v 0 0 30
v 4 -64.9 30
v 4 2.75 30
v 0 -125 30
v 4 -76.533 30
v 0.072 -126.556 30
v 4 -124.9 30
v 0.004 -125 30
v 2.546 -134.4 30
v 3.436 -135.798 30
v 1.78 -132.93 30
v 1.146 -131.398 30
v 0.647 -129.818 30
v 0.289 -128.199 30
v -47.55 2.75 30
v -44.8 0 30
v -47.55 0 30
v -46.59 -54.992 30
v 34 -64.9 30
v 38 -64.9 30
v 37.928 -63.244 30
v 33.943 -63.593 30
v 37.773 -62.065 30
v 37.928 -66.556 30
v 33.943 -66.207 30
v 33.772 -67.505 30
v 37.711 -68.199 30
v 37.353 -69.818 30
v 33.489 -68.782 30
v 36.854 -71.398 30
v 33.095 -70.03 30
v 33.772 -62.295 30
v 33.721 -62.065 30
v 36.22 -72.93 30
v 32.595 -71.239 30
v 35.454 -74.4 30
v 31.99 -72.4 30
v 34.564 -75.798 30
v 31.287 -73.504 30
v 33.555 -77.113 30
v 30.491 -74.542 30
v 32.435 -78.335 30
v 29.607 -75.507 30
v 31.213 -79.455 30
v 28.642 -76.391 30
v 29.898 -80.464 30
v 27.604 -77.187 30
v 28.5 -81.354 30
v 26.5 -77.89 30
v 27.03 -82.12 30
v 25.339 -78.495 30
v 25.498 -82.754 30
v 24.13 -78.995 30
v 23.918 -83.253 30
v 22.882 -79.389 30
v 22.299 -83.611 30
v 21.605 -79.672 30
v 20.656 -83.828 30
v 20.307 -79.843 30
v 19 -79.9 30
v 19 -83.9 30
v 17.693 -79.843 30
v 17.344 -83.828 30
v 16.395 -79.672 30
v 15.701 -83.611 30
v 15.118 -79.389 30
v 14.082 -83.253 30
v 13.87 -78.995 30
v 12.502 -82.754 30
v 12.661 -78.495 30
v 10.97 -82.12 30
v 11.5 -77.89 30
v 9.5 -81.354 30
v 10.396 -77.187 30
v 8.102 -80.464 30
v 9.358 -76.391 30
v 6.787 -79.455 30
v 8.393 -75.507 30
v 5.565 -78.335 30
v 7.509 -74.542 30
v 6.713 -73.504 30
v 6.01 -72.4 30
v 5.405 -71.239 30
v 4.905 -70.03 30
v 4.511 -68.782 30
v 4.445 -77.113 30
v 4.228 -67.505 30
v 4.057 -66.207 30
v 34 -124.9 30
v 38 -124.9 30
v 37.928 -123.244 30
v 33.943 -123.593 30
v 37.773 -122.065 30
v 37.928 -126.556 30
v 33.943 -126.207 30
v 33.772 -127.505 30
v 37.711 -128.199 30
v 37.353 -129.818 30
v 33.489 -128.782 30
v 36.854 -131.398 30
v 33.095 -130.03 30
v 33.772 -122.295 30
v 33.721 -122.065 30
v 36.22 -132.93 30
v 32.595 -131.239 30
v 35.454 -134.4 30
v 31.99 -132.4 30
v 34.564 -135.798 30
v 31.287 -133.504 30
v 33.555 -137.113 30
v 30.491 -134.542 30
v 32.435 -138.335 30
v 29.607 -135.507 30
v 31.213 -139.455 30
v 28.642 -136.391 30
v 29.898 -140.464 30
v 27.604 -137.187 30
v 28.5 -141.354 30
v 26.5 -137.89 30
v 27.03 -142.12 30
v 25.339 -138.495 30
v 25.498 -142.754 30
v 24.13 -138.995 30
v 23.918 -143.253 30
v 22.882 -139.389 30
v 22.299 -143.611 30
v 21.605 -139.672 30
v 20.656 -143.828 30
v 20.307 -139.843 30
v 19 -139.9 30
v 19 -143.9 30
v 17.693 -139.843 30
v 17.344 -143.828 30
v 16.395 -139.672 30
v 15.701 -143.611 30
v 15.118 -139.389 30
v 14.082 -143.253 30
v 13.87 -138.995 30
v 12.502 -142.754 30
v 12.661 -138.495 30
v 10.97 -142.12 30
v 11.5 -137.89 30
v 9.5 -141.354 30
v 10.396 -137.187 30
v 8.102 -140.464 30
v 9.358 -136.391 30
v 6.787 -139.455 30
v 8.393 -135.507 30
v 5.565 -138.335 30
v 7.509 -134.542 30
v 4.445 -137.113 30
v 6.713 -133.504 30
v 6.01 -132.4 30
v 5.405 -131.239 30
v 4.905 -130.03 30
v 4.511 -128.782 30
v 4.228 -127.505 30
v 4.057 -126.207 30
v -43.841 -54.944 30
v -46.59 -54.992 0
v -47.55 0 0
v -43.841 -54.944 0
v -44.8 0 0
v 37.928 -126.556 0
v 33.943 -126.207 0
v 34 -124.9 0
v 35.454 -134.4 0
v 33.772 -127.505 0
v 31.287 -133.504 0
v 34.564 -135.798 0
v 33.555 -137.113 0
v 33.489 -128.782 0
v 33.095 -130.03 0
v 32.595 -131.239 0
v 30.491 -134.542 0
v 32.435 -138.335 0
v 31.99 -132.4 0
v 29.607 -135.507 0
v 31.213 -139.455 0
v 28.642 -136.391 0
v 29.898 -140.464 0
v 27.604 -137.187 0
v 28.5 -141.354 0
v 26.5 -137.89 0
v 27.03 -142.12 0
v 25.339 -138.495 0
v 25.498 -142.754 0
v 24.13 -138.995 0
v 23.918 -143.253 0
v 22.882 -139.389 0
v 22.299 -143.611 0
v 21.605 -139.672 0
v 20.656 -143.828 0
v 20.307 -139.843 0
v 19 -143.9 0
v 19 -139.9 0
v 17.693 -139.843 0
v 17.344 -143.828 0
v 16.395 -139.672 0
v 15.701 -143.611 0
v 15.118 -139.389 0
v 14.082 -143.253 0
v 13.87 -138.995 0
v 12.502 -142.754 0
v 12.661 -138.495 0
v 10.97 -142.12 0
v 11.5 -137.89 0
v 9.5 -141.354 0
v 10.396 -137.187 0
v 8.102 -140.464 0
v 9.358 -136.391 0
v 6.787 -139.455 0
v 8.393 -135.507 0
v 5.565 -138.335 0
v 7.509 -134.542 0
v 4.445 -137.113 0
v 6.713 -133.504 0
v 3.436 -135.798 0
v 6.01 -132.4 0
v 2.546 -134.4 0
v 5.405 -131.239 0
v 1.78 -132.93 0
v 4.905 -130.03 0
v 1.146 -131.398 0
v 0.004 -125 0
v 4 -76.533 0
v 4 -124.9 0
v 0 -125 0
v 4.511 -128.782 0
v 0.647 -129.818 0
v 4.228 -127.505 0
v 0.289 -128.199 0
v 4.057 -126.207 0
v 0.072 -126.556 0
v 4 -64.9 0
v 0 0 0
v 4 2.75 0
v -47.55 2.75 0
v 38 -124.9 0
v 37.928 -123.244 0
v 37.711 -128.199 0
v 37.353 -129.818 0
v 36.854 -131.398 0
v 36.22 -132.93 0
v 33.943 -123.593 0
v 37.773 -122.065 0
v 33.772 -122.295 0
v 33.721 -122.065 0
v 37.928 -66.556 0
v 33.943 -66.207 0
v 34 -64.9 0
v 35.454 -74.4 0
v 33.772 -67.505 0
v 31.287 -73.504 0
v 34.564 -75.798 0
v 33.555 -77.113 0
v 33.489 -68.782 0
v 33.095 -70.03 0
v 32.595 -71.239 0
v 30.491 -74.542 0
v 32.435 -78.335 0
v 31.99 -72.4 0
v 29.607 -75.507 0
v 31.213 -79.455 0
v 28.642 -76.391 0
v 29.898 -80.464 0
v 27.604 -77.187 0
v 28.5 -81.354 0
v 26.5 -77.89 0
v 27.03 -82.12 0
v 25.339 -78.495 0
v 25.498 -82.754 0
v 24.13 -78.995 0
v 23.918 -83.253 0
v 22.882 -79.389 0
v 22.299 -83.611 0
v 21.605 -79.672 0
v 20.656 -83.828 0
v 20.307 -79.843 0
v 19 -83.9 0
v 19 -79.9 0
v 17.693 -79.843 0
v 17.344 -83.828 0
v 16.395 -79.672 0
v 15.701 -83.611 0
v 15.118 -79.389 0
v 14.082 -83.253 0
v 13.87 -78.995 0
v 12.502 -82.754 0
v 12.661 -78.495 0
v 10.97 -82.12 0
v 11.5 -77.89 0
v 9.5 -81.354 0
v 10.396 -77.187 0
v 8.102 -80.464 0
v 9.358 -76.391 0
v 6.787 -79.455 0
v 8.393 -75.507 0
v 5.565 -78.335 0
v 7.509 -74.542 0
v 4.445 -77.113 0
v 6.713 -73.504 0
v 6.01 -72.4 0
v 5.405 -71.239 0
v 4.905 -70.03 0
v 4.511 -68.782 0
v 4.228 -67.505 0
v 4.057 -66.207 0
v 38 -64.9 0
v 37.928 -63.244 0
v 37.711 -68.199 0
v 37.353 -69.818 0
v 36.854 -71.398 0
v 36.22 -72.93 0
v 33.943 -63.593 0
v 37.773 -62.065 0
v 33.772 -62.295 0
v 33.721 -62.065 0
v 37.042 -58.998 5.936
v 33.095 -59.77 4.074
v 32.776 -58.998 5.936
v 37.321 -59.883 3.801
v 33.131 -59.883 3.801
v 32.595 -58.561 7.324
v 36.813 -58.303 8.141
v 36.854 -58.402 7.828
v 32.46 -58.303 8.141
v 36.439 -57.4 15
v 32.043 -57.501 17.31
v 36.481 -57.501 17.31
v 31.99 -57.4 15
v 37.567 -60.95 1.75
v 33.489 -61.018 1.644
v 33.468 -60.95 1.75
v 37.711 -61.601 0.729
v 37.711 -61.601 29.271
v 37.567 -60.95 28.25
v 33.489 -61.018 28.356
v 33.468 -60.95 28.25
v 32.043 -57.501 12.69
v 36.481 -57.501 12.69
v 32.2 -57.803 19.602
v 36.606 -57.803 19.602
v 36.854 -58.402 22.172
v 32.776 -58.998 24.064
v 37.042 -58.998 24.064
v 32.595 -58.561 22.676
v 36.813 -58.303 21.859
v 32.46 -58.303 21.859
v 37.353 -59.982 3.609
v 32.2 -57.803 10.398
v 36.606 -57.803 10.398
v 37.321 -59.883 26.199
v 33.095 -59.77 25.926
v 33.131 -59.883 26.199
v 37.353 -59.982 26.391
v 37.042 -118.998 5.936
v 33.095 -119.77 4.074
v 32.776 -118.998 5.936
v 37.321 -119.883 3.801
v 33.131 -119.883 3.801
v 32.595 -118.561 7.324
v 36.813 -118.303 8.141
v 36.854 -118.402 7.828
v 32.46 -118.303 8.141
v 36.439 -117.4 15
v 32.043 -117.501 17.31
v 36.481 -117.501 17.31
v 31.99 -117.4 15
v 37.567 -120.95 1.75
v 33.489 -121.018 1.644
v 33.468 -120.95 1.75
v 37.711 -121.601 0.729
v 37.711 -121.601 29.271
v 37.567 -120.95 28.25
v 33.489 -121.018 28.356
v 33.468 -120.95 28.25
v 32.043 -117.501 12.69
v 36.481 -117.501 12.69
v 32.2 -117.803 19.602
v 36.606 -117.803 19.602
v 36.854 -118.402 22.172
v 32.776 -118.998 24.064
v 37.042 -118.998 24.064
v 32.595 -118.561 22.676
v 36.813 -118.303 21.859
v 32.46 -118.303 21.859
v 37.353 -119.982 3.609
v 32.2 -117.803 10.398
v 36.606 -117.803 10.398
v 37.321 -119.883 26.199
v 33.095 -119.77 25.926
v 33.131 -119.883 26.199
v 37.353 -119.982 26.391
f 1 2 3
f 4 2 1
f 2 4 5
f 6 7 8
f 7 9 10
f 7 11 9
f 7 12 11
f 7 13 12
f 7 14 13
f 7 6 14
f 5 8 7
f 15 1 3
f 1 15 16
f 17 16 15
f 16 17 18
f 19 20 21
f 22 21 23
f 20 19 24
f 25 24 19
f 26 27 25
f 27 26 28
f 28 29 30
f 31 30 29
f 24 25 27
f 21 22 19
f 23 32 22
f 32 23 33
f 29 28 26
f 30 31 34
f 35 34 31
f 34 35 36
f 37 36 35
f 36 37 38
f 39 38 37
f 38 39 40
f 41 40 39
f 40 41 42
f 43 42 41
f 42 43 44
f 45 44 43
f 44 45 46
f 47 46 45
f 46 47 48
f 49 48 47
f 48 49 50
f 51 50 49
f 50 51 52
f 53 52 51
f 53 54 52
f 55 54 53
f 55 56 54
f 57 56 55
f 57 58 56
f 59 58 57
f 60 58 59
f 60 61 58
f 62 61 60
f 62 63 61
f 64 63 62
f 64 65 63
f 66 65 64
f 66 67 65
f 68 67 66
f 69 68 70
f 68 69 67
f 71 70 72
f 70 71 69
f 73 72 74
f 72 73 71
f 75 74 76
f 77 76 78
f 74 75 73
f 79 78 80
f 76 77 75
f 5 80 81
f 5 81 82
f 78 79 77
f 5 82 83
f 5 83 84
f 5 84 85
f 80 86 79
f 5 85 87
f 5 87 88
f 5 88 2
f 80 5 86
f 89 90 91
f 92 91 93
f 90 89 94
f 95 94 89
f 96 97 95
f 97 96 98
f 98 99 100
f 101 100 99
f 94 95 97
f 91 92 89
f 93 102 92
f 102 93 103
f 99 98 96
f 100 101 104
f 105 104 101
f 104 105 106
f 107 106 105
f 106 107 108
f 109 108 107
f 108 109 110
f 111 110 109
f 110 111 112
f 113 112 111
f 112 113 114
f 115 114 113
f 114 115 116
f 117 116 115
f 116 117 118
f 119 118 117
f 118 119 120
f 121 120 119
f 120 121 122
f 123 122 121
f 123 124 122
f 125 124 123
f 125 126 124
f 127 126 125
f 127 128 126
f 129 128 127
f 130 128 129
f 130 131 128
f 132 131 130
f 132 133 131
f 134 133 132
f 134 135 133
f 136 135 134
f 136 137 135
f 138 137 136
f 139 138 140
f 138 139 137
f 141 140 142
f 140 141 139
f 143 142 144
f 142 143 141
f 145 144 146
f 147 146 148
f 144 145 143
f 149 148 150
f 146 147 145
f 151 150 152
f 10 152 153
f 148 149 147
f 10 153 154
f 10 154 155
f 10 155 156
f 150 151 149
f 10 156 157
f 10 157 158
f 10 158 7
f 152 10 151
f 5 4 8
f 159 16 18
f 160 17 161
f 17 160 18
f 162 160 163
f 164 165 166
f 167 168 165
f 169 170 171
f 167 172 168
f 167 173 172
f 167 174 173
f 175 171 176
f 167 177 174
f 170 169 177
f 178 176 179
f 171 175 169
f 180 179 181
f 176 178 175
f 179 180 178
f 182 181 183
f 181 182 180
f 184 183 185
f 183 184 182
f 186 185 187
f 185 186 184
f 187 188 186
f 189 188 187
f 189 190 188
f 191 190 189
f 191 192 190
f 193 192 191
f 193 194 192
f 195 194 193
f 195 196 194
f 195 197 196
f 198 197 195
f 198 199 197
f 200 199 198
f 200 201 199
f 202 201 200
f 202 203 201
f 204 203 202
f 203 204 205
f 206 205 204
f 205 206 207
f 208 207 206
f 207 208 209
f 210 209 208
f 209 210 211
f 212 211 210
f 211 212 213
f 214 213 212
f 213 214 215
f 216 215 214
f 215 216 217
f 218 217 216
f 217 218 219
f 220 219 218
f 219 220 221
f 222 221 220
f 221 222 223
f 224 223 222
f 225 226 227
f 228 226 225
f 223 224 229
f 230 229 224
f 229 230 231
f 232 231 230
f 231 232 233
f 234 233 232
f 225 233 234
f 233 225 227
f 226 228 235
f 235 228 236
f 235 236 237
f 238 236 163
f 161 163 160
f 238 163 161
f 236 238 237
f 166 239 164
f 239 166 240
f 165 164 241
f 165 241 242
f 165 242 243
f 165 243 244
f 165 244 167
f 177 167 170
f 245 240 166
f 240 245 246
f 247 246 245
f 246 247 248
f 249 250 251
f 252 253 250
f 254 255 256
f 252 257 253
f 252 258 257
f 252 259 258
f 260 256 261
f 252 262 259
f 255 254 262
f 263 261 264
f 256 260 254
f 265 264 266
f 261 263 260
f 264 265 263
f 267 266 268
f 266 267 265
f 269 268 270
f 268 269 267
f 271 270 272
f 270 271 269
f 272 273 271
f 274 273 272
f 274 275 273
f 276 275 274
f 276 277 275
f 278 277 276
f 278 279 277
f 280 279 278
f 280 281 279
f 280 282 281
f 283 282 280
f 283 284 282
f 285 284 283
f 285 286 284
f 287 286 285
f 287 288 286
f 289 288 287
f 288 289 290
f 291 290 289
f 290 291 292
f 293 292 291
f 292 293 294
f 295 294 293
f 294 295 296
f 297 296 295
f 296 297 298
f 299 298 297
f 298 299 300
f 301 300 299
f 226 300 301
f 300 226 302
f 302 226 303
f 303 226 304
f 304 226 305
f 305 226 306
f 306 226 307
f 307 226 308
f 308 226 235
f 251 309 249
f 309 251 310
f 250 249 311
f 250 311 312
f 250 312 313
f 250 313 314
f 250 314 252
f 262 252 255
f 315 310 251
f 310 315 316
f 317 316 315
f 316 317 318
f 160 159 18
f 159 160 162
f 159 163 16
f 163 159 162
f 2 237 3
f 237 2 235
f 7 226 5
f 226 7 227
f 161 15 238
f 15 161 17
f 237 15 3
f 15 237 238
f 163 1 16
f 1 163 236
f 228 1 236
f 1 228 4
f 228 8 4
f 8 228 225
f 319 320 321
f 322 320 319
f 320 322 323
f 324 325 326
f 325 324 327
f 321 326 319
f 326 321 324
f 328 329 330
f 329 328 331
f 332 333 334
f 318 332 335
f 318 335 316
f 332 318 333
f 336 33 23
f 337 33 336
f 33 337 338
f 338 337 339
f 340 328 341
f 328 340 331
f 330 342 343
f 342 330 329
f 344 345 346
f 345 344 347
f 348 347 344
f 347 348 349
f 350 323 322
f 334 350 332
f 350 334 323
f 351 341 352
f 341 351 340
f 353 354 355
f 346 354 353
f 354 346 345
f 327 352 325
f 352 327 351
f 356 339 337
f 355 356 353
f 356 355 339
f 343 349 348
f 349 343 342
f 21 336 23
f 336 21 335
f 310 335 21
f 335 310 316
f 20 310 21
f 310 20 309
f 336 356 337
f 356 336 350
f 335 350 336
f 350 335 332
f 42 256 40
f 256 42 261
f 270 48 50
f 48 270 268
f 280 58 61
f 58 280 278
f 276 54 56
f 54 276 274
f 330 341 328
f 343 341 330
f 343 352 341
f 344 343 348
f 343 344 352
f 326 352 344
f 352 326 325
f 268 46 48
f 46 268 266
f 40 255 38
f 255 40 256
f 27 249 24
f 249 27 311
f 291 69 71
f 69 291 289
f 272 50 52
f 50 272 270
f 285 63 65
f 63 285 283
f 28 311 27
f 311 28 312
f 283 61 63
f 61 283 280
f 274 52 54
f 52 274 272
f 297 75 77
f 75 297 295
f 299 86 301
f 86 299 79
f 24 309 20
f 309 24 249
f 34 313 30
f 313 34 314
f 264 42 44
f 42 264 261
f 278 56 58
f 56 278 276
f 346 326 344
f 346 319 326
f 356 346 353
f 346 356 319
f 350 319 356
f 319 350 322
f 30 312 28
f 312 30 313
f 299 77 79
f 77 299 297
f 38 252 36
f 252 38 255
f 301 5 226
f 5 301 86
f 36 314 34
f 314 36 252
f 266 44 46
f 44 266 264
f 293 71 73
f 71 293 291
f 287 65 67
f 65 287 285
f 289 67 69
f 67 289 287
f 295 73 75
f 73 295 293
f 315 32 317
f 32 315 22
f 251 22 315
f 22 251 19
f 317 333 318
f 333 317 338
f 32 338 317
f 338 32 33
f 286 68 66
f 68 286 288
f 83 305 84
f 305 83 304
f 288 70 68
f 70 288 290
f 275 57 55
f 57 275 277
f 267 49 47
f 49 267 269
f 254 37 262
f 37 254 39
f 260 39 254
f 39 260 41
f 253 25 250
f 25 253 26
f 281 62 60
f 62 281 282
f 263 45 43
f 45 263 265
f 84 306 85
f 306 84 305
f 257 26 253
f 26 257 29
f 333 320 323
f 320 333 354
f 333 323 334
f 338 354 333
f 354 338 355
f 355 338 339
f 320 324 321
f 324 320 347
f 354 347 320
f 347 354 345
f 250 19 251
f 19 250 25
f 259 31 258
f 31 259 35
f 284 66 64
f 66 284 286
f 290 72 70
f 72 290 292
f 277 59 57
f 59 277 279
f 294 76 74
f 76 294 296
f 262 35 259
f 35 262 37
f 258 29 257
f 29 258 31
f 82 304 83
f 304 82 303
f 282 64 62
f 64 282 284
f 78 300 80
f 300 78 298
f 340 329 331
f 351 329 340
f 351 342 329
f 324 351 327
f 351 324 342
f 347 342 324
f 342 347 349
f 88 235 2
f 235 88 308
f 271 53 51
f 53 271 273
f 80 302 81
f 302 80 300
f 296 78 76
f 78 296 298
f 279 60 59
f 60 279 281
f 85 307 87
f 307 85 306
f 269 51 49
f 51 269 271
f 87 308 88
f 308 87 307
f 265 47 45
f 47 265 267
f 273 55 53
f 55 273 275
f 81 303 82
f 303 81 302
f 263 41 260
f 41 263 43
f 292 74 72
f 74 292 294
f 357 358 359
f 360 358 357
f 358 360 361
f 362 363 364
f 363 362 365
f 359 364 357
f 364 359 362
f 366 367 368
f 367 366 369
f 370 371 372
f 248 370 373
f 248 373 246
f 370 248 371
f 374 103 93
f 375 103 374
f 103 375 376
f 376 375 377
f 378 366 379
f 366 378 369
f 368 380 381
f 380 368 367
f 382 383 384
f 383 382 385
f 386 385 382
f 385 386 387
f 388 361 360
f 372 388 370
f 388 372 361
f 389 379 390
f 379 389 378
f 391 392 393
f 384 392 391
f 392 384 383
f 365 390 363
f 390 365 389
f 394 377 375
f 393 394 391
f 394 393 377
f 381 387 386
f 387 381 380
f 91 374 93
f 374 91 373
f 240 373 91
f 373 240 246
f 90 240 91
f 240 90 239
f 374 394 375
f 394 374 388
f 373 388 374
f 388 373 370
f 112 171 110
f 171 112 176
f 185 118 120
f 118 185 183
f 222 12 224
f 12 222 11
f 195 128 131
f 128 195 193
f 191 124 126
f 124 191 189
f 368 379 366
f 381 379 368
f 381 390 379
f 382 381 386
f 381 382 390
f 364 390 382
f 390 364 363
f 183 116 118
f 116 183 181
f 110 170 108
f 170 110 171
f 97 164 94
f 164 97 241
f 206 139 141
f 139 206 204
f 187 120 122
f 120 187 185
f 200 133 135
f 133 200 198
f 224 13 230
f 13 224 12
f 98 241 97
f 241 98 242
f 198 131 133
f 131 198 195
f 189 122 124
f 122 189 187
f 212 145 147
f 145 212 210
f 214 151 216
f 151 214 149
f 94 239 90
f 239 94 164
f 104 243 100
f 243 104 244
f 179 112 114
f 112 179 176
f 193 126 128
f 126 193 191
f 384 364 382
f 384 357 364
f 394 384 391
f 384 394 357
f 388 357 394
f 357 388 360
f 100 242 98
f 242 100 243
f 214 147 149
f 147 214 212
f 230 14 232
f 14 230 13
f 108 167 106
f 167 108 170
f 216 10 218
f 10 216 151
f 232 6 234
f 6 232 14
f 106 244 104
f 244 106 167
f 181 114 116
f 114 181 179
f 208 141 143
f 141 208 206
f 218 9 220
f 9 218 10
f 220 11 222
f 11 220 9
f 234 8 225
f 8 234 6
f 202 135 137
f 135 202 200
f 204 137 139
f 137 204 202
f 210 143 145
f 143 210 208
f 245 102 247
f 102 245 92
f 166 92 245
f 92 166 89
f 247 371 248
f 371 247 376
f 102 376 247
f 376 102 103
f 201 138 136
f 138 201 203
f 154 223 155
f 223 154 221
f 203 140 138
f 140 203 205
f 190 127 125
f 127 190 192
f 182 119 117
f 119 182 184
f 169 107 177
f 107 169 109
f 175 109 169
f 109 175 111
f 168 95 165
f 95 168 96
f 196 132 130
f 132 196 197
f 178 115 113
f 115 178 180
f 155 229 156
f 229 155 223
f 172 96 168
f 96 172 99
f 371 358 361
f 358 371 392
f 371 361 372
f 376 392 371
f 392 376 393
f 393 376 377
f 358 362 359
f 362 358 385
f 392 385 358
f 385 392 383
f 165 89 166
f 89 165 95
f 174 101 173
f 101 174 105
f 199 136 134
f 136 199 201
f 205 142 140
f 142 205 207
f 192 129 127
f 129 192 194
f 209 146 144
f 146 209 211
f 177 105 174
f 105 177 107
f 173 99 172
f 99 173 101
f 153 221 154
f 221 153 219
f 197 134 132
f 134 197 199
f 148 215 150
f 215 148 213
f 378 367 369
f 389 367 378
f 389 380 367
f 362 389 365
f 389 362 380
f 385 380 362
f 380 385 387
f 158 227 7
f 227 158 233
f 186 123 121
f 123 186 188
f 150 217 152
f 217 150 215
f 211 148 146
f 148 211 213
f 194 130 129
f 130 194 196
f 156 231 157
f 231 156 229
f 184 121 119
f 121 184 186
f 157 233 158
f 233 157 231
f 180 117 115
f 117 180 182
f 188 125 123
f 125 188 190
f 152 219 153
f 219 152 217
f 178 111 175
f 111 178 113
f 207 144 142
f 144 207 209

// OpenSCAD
/* [Door parameters] */
// Door thickness (inner distance between front and back of door hook)
clip_depth = 44.8;
// Thickness of top and overhang (make sure it fits gap between door and frame)
top_and_back_thickness = 2.75;

/* [Hook parameters] */
// Width of entire hook
width = 30;
// Thickness of front piece and hanger hooks
hook_and_front_thickness = 4;
// Length of overhang on back side of the door
clip_length = 55;


number_of_hooks = 2;
// Distance between top of door and first hanger hook
first_hook_offset = 65;  // rounded: 60
// Distance between successive hanger hooks (if more than one)
hook_distance = 60;  // rounded: 60
// Radius of hanger hook curve
hook_radius = 15;

hook_style = "rounded"; // [simple:Simple,rounded:Rounded]

/* [Advanced] */

// Angle back of clip inwards (towards door), to help with friction; don't go crazy with this or you'll put too much stress on clip
clip_angle = 1;
// Add support buttress on hooks (except last); might help reduce flex, but looks a bit uglier (IMO)
inner_hook_buttress = 0; // [0:No,1:Yes]


/* [Hidden] */

$fn = 72;
thickness = hook_and_front_thickness;
top_thickness = top_and_back_thickness;

module hook_base() {
  difference() {
    cylinder(h=width, r=hook_radius+thickness);
    translate([0,0,-1])
      cylinder(h=width+2, r=hook_radius);
    translate([-hook_radius-thickness-1, 0, -1]) 
      cube([2*(hook_radius+thickness+1), hook_radius+thickness+1, width+2]); 
  }
}

module simple_hook() {
  translate([hook_radius+thickness, 0, 0]) union() {
    hook_base();
    translate([hook_radius+thickness/2, 0, 0])
      cylinder(h=width, r=thickness/2, $fn=18);
  }
}

module rounded_hook() {
  translate([0, -hook_radius-thickness, 0]) difference() {
    intersection() {
      cube([2*(hook_radius+thickness), 1.5*hook_radius+thickness+1, width]);
      translate([0, 0, width/2]) rotate([0, 90, 0]) cylinder(h=2*(hook_radius+thickness), r=1.5*hook_radius+thickness);
      translate([hook_radius+thickness, hook_radius+thickness, -1]) cylinder(r=hook_radius+thickness, h=width+2);
    }
    translate([hook_radius+thickness, hook_radius+thickness, -1]) cylinder(r=hook_radius, h=width+2);
    translate([-1, hook_radius+thickness, -1]) cube([hook_radius+thickness+2, hook_radius, width+2]);
  }
}

module hook() {
  if (hook_style == "simple") {
    simple_hook();
  } else if (hook_style == "rounded") {
    rounded_hook();
  }
}

module clip() {
  front_length = first_hook_offset + (number_of_hooks - 1) * hook_distance;
  union() {
    translate([-clip_depth-top_thickness, 0, 0]) rotate([0, 0, clip_angle]) translate([0, -clip_length, 0])
      cube([top_thickness, clip_length, width]);
    translate([-clip_depth-top_thickness, 0, 0])
      cube([clip_depth + top_thickness + thickness, top_thickness, width]);
    translate([0, -front_length, 0])
      cube([thickness, front_length, width]);
  }
}

module door_hook() {
  butt_theta = acos(hook_radius/(hook_radius+thickness));
  clip();
  for (i = [0:(number_of_hooks-1)]) {
    translate([0, -first_hook_offset-i*hook_distance+.1, 0]) union() {
      hook();
      if ((i < number_of_hooks-1) && (inner_hook_buttress != 0)) {
        translate([0,-(hook_radius+thickness)*tan(butt_theta),0]) rotate([0, 0, butt_theta]) translate([0, -thickness, 0]) cube([thickness*(1+1/cos(butt_theta)),thickness,width]);
      }
    }
  }
}

door_hook();
